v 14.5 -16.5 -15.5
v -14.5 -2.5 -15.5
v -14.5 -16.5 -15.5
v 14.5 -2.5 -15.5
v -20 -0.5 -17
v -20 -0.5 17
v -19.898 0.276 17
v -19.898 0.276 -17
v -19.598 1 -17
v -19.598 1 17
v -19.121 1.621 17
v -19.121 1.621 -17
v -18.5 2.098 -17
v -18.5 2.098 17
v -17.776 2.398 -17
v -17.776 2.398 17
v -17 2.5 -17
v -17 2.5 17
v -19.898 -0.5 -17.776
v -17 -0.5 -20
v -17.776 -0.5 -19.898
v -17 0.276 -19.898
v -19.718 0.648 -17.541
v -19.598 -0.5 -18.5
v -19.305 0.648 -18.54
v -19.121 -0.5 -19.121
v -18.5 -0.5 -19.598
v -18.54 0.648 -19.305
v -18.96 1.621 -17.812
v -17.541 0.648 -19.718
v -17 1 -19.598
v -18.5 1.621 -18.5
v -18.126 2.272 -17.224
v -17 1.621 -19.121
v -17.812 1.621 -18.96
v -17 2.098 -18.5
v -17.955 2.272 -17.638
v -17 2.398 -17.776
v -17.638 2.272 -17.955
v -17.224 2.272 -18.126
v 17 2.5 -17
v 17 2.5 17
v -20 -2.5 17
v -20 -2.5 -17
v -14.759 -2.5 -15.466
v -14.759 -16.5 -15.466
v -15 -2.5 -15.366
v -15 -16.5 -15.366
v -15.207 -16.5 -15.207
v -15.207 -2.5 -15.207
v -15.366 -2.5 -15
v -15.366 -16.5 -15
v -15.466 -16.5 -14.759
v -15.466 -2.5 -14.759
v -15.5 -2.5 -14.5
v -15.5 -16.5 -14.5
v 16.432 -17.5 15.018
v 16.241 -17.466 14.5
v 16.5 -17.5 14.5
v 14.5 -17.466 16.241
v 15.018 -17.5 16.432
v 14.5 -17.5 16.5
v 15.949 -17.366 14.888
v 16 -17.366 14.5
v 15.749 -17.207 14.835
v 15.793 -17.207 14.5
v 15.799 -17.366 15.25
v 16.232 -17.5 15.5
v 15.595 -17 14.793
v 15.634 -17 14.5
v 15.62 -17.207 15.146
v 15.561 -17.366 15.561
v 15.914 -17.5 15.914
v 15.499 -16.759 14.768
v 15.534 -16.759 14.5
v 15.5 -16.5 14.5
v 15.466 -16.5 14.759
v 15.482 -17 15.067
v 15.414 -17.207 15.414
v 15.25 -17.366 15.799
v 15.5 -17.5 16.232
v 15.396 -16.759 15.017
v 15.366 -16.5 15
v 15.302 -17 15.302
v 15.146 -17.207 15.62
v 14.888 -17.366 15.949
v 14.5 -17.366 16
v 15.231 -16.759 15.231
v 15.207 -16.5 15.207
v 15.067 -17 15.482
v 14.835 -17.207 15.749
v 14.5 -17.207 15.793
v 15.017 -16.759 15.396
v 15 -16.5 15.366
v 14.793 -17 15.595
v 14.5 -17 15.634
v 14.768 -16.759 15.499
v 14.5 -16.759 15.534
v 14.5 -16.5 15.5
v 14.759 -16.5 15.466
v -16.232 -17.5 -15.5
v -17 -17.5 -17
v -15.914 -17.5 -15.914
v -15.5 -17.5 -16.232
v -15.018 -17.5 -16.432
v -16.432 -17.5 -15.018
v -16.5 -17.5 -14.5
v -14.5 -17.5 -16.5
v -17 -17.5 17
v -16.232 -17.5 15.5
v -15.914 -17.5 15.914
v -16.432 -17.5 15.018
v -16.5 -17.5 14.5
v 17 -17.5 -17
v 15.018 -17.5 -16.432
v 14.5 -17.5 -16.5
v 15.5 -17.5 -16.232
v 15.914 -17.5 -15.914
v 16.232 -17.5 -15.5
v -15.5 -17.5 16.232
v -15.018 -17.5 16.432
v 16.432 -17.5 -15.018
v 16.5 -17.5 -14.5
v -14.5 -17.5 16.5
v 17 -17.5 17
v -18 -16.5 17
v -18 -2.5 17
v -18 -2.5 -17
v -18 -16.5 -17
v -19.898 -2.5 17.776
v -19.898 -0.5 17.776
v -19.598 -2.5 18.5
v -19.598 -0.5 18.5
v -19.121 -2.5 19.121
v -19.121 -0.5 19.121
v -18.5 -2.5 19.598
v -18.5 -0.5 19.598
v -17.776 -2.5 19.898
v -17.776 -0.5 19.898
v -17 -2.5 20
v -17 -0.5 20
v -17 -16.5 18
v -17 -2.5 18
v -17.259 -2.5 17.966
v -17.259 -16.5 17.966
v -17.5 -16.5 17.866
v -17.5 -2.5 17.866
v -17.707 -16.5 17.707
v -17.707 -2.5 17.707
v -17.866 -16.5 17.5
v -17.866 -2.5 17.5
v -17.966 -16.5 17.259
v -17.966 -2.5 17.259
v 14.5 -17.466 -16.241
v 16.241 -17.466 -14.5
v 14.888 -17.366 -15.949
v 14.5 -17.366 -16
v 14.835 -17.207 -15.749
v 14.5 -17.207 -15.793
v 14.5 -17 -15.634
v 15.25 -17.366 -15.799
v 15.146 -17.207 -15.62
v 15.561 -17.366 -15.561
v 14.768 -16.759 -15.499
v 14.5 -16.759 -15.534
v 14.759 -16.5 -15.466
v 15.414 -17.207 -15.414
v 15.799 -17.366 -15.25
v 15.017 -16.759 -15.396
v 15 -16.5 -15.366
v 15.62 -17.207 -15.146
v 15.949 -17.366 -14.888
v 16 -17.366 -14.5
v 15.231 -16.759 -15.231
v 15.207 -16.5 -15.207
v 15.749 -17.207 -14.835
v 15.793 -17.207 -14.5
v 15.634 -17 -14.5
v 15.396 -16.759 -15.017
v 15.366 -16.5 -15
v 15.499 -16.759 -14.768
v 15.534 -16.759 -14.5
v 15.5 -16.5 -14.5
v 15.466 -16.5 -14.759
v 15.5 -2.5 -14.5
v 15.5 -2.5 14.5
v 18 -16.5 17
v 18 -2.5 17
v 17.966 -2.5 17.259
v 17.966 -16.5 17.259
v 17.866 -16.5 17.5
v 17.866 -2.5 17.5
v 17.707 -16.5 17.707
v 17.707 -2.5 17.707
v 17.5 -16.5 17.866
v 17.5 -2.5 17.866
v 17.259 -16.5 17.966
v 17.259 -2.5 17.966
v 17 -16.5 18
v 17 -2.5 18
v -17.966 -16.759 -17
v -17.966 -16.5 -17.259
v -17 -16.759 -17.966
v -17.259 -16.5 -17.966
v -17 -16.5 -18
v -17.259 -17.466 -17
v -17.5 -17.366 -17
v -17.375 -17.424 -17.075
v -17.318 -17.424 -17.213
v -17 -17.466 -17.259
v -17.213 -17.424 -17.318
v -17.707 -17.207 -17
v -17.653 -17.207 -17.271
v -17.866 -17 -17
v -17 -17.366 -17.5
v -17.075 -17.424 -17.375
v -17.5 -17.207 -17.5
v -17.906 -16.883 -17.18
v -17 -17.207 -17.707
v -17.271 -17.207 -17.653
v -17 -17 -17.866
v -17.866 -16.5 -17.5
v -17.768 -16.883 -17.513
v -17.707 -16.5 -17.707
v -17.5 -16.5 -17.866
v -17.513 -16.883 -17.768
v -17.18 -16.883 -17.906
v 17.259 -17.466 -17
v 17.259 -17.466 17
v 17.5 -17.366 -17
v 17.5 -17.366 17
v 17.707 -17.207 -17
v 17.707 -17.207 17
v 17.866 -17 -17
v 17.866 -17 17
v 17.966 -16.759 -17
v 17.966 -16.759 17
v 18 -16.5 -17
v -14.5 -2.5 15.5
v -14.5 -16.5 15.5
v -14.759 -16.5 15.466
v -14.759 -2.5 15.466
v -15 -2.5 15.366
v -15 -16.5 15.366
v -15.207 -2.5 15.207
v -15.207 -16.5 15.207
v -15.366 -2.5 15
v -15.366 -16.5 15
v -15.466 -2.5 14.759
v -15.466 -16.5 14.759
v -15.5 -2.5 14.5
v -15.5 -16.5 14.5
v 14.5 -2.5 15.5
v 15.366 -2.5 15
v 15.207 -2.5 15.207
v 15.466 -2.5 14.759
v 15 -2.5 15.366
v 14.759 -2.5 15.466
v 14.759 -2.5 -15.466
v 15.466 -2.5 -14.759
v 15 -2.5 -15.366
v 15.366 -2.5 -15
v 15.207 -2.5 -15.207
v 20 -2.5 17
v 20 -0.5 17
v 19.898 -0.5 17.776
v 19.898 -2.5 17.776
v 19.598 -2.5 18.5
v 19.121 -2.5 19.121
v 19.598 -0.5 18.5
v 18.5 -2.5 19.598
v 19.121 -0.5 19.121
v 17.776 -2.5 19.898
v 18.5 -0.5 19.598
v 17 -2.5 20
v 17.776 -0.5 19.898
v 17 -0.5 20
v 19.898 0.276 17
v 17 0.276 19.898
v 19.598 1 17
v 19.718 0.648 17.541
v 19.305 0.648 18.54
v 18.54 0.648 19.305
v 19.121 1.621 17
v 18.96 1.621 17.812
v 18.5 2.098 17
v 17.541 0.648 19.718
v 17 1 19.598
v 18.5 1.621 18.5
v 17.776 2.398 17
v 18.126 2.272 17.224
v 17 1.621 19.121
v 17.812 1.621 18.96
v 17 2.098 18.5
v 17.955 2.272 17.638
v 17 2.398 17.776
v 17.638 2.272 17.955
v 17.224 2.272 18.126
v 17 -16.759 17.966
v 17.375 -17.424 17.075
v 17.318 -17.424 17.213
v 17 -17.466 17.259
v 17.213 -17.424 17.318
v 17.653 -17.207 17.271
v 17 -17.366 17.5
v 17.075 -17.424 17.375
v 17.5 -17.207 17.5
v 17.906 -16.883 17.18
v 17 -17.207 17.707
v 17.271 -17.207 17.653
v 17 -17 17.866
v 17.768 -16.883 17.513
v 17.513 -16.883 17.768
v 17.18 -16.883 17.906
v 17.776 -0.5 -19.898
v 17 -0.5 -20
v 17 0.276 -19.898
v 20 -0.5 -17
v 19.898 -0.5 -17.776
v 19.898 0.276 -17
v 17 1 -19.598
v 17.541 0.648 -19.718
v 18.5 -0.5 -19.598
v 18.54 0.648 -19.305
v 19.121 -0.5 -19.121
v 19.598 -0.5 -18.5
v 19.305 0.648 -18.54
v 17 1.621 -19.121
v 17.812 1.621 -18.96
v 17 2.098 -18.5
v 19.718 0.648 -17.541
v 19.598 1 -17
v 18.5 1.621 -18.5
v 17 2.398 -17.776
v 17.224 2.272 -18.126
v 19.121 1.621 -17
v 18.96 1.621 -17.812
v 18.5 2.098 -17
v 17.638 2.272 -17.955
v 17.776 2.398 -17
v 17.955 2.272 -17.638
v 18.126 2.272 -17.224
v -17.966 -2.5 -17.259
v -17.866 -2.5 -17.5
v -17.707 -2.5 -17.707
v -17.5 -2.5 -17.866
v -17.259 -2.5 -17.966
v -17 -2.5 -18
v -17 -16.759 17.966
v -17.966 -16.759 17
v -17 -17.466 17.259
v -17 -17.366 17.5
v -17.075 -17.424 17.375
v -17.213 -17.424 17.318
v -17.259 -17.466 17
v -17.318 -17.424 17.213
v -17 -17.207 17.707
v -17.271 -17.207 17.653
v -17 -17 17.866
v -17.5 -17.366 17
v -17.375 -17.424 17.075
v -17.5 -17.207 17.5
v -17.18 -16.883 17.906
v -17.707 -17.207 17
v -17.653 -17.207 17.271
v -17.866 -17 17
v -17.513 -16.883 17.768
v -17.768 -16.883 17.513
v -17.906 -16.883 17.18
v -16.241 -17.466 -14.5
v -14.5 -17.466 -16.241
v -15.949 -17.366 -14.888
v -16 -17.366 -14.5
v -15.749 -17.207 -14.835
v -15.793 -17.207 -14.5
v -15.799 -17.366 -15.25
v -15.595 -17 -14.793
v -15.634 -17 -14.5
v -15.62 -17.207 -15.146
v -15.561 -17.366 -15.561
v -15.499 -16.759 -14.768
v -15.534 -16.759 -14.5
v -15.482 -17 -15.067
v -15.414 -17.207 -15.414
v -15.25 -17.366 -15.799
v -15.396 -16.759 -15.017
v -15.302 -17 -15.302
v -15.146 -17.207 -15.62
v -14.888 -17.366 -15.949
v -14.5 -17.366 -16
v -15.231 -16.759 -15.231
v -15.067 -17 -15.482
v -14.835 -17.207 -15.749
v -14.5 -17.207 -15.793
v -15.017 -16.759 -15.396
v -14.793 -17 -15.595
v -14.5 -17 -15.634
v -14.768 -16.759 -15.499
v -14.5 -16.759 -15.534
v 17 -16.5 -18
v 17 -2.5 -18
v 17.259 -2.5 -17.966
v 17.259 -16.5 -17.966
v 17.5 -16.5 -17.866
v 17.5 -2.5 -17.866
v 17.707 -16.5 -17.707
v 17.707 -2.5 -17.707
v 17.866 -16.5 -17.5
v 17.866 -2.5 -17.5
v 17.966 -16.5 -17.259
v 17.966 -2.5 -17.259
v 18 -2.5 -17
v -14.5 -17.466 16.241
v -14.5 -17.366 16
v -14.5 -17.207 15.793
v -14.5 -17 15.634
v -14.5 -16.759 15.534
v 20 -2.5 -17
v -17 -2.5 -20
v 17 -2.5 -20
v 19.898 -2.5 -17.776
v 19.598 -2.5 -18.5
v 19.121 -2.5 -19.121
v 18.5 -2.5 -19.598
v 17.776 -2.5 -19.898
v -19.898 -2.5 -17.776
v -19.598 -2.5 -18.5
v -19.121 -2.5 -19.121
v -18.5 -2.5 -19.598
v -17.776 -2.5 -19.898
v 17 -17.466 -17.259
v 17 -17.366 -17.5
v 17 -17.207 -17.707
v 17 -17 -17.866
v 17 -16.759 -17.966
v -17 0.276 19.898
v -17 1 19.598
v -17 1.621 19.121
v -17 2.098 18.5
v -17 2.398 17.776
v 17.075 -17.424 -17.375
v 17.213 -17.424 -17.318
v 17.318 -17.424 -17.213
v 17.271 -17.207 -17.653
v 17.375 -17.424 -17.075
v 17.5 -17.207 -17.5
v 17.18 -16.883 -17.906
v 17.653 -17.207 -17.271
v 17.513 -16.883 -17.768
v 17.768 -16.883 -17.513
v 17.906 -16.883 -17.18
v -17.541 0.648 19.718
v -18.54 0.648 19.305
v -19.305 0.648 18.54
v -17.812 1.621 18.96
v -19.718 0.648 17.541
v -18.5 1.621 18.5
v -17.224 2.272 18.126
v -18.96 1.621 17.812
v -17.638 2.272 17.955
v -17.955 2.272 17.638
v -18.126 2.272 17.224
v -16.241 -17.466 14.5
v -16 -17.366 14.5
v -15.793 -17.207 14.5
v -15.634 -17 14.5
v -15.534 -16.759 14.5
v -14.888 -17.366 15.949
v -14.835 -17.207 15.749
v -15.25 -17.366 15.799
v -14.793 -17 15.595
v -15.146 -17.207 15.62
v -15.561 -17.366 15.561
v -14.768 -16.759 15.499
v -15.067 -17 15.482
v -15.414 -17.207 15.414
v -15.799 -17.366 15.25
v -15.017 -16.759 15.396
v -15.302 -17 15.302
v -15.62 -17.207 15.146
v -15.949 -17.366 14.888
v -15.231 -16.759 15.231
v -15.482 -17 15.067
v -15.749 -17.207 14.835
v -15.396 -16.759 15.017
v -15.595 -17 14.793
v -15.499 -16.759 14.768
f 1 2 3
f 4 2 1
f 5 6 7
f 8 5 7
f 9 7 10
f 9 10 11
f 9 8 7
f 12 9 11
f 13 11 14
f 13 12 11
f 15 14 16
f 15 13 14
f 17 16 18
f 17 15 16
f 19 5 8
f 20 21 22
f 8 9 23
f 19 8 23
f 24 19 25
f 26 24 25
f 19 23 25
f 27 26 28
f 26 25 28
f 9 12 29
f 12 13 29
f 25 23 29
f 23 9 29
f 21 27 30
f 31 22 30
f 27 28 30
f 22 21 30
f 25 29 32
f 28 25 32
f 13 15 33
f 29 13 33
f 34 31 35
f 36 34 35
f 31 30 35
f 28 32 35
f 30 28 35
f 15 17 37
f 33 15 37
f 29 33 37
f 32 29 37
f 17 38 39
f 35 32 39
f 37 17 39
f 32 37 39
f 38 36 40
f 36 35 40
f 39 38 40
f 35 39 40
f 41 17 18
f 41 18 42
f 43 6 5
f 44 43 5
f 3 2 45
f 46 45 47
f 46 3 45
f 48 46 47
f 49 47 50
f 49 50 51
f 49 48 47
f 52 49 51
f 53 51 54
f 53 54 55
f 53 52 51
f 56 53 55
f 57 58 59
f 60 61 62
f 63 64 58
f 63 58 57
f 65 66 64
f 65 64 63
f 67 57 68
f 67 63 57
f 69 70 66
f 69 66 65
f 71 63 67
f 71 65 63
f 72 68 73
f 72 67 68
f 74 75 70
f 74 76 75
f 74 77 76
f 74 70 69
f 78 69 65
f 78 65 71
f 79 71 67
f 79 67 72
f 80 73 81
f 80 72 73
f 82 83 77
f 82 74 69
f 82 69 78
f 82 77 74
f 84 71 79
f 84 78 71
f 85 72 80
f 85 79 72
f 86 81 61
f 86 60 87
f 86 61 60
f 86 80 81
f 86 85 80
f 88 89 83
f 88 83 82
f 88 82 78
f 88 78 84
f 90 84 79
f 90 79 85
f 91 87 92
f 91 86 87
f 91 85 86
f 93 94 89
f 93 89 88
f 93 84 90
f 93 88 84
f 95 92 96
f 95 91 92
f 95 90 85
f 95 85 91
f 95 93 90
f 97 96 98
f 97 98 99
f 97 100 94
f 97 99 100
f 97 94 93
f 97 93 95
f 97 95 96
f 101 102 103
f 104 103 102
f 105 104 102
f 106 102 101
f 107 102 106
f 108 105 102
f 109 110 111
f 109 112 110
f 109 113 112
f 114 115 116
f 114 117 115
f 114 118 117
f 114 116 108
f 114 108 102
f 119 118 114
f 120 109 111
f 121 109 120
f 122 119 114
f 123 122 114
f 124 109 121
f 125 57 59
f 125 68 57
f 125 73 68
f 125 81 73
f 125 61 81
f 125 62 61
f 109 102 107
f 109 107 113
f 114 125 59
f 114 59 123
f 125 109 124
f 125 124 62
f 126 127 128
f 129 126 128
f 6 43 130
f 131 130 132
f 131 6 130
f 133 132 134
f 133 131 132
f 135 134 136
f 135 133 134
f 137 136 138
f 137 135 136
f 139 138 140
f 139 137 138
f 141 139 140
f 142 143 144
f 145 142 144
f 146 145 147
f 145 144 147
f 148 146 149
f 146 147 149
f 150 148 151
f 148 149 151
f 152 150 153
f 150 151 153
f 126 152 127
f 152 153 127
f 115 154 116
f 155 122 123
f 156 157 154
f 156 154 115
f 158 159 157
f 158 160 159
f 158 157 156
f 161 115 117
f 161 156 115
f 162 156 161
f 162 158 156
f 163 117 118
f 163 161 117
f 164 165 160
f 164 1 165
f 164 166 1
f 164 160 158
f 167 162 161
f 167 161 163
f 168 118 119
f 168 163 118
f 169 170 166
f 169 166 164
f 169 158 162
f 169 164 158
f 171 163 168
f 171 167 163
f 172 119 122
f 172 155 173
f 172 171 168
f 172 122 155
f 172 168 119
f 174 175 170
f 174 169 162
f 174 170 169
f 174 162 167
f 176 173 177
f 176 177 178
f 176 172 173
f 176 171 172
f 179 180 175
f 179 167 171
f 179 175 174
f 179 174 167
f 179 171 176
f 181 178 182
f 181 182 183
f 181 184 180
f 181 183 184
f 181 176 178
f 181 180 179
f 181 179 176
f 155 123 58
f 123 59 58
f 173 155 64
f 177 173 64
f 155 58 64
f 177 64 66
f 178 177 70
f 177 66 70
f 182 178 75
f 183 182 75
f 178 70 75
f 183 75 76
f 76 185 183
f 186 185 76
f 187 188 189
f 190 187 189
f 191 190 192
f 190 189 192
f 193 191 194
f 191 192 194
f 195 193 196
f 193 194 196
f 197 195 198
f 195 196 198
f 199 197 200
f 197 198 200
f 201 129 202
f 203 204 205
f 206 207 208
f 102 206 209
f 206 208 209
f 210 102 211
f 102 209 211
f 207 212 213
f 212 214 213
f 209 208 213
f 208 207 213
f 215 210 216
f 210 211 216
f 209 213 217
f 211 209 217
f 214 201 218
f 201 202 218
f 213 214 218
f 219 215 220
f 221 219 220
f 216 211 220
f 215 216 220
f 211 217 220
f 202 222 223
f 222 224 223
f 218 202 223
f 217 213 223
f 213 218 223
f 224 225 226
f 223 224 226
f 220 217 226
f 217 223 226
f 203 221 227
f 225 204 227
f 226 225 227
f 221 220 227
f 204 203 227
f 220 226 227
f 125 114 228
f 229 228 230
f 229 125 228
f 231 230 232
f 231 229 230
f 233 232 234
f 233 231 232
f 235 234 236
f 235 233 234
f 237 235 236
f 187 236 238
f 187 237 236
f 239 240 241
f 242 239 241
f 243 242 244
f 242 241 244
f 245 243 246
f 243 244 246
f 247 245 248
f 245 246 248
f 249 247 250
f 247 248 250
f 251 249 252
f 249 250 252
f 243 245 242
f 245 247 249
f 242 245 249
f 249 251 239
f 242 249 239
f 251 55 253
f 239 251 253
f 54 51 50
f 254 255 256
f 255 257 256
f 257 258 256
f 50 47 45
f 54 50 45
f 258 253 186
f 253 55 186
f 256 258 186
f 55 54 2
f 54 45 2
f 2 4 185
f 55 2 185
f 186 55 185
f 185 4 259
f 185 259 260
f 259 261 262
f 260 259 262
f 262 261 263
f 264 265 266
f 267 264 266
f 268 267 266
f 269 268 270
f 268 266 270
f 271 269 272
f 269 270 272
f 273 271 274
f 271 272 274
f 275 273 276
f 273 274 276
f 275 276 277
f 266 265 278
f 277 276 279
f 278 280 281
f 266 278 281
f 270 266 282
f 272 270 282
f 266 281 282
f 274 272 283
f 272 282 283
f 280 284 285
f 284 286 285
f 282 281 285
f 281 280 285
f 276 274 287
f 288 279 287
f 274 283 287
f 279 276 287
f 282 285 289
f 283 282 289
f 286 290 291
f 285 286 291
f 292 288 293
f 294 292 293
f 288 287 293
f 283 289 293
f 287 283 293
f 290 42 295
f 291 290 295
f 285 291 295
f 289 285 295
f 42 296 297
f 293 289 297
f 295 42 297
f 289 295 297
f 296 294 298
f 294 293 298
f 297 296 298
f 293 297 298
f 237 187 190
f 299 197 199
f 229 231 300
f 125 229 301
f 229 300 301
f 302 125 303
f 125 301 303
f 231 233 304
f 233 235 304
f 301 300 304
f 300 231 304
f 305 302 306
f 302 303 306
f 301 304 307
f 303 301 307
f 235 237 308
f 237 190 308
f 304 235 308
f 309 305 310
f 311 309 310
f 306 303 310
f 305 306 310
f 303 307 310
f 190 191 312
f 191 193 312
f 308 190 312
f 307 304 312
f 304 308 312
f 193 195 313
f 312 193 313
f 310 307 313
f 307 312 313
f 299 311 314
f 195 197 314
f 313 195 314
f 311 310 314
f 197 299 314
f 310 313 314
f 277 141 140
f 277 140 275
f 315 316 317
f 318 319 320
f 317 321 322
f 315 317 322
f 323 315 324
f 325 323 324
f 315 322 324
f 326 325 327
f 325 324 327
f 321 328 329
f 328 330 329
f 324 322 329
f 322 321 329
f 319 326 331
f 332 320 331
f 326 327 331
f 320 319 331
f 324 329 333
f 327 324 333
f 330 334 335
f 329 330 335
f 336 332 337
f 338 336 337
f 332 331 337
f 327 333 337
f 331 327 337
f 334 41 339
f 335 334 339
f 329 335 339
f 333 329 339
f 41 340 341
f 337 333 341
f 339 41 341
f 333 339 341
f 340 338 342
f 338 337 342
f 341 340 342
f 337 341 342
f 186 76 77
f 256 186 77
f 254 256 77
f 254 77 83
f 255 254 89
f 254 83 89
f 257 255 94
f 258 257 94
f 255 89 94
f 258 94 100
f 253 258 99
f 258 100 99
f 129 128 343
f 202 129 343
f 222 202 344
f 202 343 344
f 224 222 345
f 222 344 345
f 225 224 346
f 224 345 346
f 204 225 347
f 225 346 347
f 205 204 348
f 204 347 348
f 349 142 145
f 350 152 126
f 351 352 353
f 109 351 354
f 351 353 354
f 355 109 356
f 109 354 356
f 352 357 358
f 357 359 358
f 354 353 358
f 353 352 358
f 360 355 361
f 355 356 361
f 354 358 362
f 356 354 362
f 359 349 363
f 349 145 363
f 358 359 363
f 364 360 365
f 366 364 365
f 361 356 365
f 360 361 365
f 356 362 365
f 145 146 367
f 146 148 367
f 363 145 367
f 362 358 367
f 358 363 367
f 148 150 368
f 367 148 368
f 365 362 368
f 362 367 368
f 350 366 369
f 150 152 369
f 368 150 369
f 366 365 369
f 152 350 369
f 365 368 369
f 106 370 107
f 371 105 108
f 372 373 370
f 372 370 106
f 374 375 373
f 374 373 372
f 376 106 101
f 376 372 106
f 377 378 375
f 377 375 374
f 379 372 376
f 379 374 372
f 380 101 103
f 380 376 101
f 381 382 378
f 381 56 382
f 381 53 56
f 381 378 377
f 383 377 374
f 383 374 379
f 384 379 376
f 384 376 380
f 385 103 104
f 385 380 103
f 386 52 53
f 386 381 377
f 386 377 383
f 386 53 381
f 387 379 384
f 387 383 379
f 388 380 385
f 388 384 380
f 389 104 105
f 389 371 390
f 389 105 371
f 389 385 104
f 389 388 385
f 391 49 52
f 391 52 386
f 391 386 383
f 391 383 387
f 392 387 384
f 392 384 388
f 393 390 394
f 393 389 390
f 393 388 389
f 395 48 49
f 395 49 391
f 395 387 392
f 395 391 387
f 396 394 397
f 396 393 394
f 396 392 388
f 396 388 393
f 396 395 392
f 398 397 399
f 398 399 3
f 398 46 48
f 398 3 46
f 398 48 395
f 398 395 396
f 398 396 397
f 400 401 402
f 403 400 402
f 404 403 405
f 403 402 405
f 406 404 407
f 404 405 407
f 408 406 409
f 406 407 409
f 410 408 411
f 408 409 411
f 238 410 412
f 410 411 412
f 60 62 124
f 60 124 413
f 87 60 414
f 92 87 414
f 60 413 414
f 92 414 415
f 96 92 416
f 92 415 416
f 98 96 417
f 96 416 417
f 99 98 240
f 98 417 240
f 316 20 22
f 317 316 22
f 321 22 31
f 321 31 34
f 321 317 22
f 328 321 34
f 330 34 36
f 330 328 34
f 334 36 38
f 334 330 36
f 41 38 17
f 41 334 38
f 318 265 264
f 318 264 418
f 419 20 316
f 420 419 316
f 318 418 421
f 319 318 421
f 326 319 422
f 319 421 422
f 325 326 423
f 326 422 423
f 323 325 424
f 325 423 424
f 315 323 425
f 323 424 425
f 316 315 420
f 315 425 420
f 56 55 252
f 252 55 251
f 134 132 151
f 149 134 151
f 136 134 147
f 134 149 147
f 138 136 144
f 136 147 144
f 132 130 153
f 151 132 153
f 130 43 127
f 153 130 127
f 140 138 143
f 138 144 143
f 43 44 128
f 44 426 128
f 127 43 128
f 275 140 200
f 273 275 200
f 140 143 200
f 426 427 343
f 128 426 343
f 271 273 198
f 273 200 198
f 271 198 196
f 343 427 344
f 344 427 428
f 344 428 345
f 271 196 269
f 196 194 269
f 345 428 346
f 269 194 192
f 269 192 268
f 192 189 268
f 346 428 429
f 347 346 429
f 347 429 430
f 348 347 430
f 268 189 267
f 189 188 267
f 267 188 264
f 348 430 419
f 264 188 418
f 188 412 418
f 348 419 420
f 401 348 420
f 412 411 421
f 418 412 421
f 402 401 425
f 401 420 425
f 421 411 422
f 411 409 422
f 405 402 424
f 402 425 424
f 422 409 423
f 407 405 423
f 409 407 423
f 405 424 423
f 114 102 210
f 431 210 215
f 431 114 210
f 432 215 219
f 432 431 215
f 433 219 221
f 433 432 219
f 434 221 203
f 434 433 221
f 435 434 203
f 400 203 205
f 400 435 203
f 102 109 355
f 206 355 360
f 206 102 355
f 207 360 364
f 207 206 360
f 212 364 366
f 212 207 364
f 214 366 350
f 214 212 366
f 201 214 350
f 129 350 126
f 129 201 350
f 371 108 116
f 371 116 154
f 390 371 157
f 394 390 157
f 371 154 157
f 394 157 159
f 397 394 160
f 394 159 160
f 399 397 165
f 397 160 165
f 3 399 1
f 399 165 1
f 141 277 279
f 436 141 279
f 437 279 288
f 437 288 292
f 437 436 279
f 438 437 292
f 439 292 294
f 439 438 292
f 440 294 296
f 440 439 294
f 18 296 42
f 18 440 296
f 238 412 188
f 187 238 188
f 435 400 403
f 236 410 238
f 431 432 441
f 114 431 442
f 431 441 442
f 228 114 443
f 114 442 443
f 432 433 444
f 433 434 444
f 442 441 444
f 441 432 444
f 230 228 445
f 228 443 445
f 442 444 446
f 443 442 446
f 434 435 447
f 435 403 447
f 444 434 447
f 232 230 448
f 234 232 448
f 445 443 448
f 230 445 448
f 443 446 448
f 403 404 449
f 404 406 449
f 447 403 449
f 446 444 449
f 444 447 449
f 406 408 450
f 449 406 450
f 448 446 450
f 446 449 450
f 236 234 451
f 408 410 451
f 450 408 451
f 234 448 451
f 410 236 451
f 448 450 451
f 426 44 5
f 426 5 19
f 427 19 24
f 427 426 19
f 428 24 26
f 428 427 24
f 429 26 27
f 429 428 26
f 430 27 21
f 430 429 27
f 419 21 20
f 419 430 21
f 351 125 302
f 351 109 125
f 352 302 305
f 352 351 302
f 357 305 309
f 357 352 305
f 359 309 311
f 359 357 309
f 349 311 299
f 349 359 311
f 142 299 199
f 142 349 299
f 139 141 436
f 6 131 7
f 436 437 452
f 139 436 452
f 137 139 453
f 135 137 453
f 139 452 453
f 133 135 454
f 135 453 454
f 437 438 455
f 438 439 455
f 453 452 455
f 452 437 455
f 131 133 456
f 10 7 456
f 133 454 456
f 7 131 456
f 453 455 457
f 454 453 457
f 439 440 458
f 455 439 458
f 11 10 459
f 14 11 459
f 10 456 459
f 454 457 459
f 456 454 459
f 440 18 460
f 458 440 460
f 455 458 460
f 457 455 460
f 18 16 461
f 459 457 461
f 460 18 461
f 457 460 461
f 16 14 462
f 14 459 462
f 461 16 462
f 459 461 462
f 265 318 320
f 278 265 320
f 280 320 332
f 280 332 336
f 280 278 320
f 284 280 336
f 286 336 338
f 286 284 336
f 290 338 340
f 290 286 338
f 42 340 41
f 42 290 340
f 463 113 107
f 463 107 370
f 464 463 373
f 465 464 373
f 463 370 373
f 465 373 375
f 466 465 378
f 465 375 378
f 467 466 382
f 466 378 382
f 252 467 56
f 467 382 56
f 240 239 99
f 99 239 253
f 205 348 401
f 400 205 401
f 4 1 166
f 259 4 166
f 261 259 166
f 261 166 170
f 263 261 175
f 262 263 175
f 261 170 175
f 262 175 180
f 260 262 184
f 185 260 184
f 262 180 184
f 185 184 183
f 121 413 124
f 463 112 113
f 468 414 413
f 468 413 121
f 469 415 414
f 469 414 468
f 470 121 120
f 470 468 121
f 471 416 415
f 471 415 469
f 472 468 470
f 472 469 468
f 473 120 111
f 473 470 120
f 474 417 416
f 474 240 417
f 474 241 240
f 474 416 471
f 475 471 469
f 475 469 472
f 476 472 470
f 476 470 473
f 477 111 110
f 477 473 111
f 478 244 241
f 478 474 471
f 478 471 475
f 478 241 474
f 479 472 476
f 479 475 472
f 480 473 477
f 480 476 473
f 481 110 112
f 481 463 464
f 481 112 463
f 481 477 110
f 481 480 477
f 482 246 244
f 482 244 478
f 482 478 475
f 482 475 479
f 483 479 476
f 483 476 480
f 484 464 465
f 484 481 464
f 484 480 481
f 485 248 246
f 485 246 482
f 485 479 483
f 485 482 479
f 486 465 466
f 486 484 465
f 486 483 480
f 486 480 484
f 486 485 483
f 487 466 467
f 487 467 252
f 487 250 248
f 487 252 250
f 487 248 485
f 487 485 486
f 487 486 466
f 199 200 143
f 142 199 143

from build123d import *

# Parameters (mm, degrees)
ESBO_O1_W                = 40
ESBO_O1_H                = 40
RESSALTO_EXTRUS_O1_DEPTH = 2.5
FILETE1_R                = 3
FILETE2_R                = 3
ESBO_O2_W                = 31
ESBO_O2_H                = 31
RESSALTO_EXTRUS_O2_DEPTH = 15
FILETE3_R                = 1
FILETE4_R                = 1


with BuildPart() as part:
    # Esboço1 → Ressalto-extrusão1 (new, symmetric)
    with BuildSketch(Plane(origin=(0, 0, 0), x_dir=(1, 0, 0), z_dir=(0, 1, 0))):
        Rectangle(ESBO_O1_W, ESBO_O1_H)
    extrude(amount=RESSALTO_EXTRUS_O1_DEPTH, both=True)

    # Filete1
    filete1_edges = [part.edges().sort_by_distance(p)[0] for p in [
        (-20, 0, -20),
        (20, 0, -20),
        (20, 0, 20),
        (-20, 0, 20),
    ]]
    fillet(filete1_edges, radius=FILETE1_R)

    # Filete2
    filete2_edges = [part.edges().sort_by_distance(p)[0] for p in [
        (-20, 2.5, 0),
        (0, 2.5, -20),
        (0, 2.5, 20),
        (20, 2.5, 0),
        (19.121320344, 2.5, 19.121320344),
        (-19.121320344, 2.5, 19.121320344),
        (19.121320344, 2.5, -19.121320344),
        (-19.121320344, 2.5, -19.121320344),
    ]]
    fillet(filete2_edges, radius=FILETE2_R)

    # Esboço2 → Ressalto-extrusão2 (add)
    with BuildSketch(Plane.XZ.offset(2.5)):
        with BuildLine():
            Line((-18, 17), (-18, -17))
            ThreePointArc((-18, -17), (-17.707106781, -17.707106781), (-17, -18))
            Line((-17, -18), (17, -18))
            ThreePointArc((17, -18), (17.707106781, -17.707106781), (18, -17))
            Line((18, -17), (18, 17))
            ThreePointArc((18, 17), (17.707106781, 17.707106781), (17, 18))
            Line((17, 18), (-17, 18))
            ThreePointArc((-17, 18), (-17.707106781, 17.707106781), (-18, 17))
        make_face()
        Rectangle(ESBO_O2_W, ESBO_O2_H, mode=Mode.SUBTRACT)
    extrude(amount=RESSALTO_EXTRUS_O2_DEPTH)

    # Filete3
    filete3_edges = [part.edges().sort_by_distance(p)[0] for p in [
        (-15.5, -10, 15.5),
        (-15.5, -10, -15.5),
        (15.5, -10, -15.5),
        (15.5, -10, 15.5),
    ]]
    fillet(filete3_edges, radius=FILETE3_R)

    # Filete4
    filete4_edges = [part.edges().sort_by_distance(p)[0] for p in [
        (15.5, -17.5, 0),
        (-15.5, -17.5, 0),
        (0, -17.5, 15.5),
        (15.207106781, -17.5, -15.207106781),
        (-15.207106781, -17.5, -15.207106781),
        (15.207106781, -17.5, 15.207106781),
        (-15.207106781, -17.5, 15.207106781),
        (-17.707106781, -17.5, 17.707106781),
        (-18, -17.5, 0),
        (-17.707106781, -17.5, -17.707106781),
        (0, -17.5, -18),
        (17.707106781, -17.5, -17.707106781),
        (18, -17.5, 0),
        (17.707106781, -17.5, 17.707106781),
        (0, -17.5, 18),
        (0, -17.5, -15.5),
    ]]
    fillet(filete4_edges, radius=FILETE4_R)


solid = part.part
